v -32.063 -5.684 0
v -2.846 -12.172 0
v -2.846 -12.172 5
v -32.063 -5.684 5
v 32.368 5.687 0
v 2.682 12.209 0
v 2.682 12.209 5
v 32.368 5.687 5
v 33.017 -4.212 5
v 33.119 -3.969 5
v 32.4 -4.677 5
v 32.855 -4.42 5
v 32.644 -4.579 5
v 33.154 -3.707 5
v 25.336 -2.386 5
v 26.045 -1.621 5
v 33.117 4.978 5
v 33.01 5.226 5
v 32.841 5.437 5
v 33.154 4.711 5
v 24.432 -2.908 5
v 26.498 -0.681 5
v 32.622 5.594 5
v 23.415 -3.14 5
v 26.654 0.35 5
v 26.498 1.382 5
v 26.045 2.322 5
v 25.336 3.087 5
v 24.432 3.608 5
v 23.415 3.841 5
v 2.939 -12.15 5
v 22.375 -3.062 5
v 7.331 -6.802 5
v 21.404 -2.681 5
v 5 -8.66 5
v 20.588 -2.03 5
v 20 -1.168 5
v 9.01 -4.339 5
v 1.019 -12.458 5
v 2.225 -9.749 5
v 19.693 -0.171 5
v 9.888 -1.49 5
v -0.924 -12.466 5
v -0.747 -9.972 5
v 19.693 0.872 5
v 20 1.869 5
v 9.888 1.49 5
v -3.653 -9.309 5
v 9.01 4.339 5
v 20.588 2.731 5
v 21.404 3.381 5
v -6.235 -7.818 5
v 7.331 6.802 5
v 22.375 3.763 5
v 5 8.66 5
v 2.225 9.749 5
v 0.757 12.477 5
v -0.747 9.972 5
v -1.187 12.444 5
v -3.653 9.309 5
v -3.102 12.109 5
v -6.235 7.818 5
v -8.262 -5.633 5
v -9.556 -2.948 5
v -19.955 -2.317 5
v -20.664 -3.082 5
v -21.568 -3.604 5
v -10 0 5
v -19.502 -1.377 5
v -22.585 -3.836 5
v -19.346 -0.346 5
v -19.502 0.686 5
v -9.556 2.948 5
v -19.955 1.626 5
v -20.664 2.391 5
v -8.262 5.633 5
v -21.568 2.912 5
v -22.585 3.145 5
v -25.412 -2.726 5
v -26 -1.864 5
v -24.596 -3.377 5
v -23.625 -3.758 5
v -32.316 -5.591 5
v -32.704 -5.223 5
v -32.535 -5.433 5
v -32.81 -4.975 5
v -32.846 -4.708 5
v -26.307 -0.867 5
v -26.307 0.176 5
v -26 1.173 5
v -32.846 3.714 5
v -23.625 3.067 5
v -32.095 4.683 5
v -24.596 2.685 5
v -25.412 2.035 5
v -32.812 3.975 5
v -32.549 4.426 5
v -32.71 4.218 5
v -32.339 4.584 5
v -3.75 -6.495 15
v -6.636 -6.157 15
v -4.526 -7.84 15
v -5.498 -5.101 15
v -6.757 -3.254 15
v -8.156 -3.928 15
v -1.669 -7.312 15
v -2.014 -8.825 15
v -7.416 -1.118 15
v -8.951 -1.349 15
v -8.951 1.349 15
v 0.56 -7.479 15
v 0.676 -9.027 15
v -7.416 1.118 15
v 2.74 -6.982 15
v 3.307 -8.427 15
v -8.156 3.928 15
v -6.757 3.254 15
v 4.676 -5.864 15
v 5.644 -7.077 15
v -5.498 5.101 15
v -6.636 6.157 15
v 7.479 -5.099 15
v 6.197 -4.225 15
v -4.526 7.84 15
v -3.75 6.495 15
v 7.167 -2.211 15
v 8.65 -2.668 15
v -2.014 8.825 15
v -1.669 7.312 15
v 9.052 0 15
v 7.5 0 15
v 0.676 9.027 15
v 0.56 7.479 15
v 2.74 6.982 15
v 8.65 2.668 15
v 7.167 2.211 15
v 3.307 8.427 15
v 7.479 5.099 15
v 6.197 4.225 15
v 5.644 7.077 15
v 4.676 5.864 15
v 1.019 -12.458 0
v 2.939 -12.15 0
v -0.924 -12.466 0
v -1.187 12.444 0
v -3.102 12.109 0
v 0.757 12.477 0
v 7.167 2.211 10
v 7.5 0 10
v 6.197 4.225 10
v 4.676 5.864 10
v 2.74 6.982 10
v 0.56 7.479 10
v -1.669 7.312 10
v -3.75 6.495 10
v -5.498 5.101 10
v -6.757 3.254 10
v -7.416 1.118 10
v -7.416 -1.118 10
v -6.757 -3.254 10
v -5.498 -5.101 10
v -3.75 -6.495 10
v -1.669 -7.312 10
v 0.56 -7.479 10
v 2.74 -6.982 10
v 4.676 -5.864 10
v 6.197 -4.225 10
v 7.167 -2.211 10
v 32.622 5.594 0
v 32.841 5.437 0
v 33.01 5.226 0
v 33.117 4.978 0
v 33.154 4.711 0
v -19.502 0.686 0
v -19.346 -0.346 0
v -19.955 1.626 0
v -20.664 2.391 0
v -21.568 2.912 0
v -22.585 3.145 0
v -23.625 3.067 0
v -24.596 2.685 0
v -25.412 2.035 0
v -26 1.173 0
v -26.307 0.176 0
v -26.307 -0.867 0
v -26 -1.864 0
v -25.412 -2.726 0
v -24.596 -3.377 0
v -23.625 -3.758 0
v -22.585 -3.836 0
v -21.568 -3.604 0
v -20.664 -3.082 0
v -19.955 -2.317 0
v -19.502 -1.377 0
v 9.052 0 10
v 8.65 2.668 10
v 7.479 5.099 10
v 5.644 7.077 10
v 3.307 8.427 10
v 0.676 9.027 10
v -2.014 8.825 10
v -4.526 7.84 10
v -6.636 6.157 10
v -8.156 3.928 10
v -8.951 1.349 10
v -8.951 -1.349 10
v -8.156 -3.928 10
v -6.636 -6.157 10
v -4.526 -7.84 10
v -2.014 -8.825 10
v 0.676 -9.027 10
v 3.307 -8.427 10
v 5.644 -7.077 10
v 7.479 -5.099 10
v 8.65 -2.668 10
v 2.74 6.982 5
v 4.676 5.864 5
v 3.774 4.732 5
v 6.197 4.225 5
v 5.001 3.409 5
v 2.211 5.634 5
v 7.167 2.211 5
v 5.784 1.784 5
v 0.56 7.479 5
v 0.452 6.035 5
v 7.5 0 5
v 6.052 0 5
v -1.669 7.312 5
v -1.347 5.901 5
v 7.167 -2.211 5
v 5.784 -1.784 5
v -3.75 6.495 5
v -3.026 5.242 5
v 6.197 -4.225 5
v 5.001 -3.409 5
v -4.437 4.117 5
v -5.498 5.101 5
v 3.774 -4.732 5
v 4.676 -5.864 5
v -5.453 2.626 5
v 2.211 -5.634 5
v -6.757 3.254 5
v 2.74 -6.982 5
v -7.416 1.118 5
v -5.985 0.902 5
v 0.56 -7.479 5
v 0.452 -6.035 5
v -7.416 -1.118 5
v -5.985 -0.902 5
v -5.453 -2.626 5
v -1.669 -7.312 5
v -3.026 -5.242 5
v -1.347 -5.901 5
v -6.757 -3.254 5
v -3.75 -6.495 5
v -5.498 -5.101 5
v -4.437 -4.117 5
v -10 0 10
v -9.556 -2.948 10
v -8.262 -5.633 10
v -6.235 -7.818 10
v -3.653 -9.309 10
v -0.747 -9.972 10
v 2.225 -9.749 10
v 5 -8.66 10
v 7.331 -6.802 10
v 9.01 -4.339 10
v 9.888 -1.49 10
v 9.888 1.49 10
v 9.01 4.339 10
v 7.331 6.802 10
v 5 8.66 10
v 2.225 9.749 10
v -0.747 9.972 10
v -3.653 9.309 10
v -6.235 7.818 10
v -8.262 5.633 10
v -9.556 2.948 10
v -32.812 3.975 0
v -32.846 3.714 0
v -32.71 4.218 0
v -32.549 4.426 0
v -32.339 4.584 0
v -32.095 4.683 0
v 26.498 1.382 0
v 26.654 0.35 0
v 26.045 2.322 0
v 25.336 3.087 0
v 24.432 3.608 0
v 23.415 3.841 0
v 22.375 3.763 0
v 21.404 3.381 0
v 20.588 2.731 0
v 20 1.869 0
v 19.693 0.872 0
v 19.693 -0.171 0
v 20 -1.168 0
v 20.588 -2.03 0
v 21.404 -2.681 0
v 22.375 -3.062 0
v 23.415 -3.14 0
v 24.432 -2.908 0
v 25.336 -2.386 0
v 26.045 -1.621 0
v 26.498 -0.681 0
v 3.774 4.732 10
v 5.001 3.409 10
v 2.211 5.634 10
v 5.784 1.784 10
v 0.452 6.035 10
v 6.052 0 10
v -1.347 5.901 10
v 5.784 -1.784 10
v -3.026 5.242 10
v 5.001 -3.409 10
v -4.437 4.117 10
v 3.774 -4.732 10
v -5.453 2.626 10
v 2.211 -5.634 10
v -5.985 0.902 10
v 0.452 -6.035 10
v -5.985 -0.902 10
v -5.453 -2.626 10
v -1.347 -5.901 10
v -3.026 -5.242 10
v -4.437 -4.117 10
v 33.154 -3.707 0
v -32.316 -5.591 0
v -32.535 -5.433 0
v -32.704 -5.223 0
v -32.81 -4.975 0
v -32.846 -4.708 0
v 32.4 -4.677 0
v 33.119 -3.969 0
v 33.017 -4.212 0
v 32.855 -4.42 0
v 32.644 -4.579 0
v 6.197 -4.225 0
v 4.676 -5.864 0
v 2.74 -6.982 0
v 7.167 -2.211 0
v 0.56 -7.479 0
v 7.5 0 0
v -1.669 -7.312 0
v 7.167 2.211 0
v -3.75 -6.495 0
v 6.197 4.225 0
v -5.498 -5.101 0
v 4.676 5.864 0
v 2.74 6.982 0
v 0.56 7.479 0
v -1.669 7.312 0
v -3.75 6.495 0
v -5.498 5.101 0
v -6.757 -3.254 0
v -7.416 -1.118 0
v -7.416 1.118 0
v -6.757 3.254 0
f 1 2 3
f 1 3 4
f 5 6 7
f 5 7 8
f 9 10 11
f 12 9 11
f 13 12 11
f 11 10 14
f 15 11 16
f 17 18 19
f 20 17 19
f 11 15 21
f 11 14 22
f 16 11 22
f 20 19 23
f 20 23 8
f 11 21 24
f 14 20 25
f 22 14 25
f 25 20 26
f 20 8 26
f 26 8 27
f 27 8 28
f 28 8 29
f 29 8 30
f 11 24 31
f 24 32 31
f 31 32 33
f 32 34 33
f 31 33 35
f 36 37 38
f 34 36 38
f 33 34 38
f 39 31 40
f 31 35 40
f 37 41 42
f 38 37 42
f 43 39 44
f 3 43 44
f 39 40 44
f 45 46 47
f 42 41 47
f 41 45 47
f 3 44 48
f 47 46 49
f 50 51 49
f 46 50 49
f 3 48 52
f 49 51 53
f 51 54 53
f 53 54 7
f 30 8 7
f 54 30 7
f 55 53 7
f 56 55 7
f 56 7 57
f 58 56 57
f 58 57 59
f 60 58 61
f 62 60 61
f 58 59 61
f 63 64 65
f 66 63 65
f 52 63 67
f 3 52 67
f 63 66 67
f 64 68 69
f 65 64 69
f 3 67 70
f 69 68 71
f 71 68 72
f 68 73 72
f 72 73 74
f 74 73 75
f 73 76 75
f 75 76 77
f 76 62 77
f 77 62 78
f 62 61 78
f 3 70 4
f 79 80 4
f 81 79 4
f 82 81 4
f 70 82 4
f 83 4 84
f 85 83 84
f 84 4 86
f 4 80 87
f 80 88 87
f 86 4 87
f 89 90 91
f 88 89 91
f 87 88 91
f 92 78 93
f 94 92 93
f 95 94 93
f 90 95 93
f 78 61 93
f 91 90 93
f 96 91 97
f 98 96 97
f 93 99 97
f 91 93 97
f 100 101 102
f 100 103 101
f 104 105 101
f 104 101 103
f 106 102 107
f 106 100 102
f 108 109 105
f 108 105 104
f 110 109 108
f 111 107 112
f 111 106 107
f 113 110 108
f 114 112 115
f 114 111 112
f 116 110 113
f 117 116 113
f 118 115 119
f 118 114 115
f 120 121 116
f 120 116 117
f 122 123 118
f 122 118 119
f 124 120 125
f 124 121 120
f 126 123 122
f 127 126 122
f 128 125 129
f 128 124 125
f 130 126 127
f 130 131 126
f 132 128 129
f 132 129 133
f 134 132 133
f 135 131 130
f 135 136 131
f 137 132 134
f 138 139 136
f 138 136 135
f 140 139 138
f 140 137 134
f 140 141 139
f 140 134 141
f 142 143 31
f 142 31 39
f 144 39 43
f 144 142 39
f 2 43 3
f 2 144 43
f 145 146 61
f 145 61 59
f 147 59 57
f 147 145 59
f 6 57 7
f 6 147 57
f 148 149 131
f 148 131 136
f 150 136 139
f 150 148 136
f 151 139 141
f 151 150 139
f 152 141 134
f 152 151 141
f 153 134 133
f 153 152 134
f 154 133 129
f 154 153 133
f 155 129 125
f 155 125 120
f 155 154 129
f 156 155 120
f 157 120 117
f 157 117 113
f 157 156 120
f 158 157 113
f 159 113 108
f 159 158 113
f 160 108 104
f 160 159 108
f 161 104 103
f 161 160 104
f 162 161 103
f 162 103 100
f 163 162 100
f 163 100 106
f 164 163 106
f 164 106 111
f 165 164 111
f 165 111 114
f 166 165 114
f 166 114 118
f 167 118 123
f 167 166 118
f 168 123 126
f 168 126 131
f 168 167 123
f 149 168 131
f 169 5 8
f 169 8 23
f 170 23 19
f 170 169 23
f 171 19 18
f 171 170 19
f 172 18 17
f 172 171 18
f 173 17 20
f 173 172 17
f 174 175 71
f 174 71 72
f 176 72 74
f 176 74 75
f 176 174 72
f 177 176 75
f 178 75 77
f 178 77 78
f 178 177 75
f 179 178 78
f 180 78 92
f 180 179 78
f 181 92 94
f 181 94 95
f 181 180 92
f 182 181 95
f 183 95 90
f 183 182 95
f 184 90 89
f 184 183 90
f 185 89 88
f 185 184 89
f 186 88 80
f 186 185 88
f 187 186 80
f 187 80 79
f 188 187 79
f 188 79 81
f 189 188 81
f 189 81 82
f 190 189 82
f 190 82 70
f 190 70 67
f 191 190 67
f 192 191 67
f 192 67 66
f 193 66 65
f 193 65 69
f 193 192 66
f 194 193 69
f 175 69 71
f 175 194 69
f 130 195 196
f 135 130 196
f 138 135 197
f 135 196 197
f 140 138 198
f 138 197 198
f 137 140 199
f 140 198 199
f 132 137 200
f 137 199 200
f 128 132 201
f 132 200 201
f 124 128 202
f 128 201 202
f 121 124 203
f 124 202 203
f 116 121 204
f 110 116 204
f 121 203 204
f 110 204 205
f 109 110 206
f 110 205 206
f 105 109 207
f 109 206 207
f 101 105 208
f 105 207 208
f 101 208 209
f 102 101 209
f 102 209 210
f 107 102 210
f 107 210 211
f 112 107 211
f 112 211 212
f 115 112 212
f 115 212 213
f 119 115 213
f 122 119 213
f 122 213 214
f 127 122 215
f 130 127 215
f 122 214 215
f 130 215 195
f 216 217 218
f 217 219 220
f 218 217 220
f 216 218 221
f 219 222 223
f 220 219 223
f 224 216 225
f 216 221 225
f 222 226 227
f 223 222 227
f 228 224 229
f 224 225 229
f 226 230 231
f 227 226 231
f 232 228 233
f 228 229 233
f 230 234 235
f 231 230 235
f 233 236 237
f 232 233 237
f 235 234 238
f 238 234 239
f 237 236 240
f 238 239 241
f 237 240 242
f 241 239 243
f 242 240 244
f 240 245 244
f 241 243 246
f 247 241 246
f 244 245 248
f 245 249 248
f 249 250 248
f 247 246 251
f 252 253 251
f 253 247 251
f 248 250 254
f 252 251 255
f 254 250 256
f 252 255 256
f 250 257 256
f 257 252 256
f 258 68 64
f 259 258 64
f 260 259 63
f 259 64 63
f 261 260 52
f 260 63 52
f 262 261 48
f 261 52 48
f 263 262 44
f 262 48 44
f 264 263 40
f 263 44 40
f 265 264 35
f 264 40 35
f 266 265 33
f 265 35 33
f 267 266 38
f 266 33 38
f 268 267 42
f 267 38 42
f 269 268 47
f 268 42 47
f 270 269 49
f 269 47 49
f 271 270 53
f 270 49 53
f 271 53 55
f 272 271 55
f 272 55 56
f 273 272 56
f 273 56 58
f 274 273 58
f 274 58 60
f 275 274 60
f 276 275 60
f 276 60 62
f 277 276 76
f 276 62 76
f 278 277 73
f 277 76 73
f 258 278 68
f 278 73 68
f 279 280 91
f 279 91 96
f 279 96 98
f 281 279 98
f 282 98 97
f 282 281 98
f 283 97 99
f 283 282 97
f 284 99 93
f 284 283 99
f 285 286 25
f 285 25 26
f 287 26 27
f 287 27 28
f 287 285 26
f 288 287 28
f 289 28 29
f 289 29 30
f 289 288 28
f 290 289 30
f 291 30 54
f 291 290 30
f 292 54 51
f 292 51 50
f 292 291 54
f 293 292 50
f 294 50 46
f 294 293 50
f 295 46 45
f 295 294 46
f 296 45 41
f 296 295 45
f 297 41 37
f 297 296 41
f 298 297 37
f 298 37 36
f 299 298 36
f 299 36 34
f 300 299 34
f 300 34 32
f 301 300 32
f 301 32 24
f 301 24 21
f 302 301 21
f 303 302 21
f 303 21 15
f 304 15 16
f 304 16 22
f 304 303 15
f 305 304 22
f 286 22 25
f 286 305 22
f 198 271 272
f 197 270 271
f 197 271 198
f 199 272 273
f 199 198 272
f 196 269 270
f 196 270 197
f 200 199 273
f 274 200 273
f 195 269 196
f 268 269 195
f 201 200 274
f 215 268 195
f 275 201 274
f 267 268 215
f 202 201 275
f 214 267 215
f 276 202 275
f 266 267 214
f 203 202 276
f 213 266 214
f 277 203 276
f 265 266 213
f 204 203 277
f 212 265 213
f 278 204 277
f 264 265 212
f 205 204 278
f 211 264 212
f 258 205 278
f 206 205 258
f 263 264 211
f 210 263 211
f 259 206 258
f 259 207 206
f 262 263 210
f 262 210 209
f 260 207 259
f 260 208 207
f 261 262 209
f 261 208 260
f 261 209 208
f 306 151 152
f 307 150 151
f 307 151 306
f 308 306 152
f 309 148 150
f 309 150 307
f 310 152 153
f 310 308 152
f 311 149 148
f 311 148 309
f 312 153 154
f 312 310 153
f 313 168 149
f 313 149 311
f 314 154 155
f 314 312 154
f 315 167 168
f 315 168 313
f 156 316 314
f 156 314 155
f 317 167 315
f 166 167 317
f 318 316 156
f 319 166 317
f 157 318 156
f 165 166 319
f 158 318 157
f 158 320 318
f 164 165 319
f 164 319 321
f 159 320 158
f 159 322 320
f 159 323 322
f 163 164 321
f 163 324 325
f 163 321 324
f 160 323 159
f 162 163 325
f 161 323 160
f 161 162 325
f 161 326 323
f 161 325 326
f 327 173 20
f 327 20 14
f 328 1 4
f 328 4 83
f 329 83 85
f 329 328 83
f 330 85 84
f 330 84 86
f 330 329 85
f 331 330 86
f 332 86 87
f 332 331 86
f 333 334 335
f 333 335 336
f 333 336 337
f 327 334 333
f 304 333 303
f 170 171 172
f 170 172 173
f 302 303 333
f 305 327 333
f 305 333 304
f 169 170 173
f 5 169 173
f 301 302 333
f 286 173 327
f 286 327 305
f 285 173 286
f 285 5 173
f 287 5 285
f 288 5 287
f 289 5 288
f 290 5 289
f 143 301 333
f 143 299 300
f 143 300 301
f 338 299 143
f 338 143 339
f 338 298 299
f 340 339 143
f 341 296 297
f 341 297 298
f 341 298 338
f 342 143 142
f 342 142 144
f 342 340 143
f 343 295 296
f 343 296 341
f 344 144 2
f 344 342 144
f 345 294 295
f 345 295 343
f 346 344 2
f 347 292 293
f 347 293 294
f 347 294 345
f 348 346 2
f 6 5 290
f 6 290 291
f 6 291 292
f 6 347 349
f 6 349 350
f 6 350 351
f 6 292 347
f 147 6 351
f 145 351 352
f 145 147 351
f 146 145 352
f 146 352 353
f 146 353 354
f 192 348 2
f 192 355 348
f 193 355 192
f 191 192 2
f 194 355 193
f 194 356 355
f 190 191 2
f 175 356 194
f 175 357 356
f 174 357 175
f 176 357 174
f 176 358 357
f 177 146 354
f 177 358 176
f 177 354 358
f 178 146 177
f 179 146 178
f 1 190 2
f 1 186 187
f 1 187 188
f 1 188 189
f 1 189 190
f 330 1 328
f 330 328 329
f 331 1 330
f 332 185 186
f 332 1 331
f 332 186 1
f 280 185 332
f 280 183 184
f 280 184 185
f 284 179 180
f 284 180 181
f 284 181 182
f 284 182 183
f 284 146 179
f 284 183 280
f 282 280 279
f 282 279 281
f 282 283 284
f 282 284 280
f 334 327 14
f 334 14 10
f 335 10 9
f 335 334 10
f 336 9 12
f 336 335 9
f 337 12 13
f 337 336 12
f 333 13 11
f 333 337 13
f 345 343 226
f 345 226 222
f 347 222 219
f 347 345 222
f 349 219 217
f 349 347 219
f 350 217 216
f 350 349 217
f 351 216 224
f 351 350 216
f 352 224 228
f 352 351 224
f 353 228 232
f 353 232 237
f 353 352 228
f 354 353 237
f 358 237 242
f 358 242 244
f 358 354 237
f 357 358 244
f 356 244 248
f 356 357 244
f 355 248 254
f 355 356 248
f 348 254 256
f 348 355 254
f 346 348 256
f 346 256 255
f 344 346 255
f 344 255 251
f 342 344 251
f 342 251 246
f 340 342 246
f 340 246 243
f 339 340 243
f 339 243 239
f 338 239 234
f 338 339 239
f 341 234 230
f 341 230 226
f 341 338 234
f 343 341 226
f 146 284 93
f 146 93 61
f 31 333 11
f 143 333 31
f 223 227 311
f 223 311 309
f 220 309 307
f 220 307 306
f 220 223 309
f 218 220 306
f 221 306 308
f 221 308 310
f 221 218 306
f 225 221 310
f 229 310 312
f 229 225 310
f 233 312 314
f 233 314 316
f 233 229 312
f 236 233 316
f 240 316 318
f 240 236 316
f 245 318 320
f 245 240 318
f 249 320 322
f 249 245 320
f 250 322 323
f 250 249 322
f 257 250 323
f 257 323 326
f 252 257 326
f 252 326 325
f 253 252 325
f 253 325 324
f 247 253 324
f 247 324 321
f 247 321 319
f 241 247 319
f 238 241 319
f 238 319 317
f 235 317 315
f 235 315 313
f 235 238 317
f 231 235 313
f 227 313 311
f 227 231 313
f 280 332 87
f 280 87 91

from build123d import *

# Parameters (mm, degrees)
SKETCH2_R           = 7.5
SKETCH2_R_2         = 3.5
BOSS_EXTRUDE1_DEPTH = 5
SKETCH3_R           = 10
SKETCH3_R_2         = 6.052399113
BOSS_EXTRUDE2_DEPTH = 5
SKETCH5_R           = 9.052399113
SKETCH5_R_2         = 7.5
BOSS_EXTRUDE3_DEPTH = 5


with BuildPart() as part:
    # Sketch2 → Boss-Extrude1 (new body)
    with BuildSketch(Plane.XY):
        with BuildLine():
            Line((-32.094512491, 4.68250523), (-3.101754703, 12.109051068))
            ThreePointArc((-3.101754703, 12.109051068), (-0.215678408, 12.498139174), (2.682104326, 12.208862207))
            Line((2.682104326, 12.208862207), (32.368196231, 5.687272056))
            ThreePointArc((32.368196231, 5.687272056), (32.932912283, 5.337233509), (33.153627885, 4.710563079))
            Line((33.153627885, 4.710563079), (33.153627885, -3.707266727))
            ThreePointArc((33.153627885, -3.707266727), (32.942891731, -4.321320943), (32.399502723, -4.676568312))
            Line((32.399502723, -4.676568312), (2.938551053, -12.149687967))
            ThreePointArc((2.938551053, -12.149687967), (0.047582142, -12.499909437), (-2.845969256, -12.171707316))
            Line((-2.845969256, -12.171707316), (-32.063143376, -5.684001735))
            ThreePointArc((-32.063143376, -5.684001735), (-32.626362904, -5.333570306), (-32.846372115, -4.707779311))
            Line((-32.846372115, -4.707779311), (-32.846372115, 3.713781144))
            ThreePointArc((-32.846372115, 3.713781144), (-32.636353246, 4.326912298), (-32.094512491, 4.68250523))
        make_face()
        Circle(SKETCH2_R, mode=Mode.SUBTRACT)
        with Locations((-22.846372115, -0.345688892)):
            Circle(SKETCH2_R_2, mode=Mode.SUBTRACT)
        with Locations((23.153627885, 0.350337985)):
            Circle(SKETCH2_R_2, mode=Mode.SUBTRACT)
    extrude(amount=BOSS_EXTRUDE1_DEPTH)

    # Sketch3 → Boss-Extrude2 (add)
    with BuildSketch(Plane.XY.offset(5)):
        with Locations(Location((0, 0, 0), (0, 0, 180))):
            Circle(SKETCH3_R)
        Circle(SKETCH3_R_2, mode=Mode.SUBTRACT)
    extrude(amount=BOSS_EXTRUDE2_DEPTH)

    # Sketch5 → Boss-Extrude3 (add)
    with BuildSketch(Plane.XY.offset(10)):
        Circle(SKETCH5_R)
        Circle(SKETCH5_R_2, mode=Mode.SUBTRACT)
    extrude(amount=BOSS_EXTRUDE3_DEPTH)


solid = part.part
